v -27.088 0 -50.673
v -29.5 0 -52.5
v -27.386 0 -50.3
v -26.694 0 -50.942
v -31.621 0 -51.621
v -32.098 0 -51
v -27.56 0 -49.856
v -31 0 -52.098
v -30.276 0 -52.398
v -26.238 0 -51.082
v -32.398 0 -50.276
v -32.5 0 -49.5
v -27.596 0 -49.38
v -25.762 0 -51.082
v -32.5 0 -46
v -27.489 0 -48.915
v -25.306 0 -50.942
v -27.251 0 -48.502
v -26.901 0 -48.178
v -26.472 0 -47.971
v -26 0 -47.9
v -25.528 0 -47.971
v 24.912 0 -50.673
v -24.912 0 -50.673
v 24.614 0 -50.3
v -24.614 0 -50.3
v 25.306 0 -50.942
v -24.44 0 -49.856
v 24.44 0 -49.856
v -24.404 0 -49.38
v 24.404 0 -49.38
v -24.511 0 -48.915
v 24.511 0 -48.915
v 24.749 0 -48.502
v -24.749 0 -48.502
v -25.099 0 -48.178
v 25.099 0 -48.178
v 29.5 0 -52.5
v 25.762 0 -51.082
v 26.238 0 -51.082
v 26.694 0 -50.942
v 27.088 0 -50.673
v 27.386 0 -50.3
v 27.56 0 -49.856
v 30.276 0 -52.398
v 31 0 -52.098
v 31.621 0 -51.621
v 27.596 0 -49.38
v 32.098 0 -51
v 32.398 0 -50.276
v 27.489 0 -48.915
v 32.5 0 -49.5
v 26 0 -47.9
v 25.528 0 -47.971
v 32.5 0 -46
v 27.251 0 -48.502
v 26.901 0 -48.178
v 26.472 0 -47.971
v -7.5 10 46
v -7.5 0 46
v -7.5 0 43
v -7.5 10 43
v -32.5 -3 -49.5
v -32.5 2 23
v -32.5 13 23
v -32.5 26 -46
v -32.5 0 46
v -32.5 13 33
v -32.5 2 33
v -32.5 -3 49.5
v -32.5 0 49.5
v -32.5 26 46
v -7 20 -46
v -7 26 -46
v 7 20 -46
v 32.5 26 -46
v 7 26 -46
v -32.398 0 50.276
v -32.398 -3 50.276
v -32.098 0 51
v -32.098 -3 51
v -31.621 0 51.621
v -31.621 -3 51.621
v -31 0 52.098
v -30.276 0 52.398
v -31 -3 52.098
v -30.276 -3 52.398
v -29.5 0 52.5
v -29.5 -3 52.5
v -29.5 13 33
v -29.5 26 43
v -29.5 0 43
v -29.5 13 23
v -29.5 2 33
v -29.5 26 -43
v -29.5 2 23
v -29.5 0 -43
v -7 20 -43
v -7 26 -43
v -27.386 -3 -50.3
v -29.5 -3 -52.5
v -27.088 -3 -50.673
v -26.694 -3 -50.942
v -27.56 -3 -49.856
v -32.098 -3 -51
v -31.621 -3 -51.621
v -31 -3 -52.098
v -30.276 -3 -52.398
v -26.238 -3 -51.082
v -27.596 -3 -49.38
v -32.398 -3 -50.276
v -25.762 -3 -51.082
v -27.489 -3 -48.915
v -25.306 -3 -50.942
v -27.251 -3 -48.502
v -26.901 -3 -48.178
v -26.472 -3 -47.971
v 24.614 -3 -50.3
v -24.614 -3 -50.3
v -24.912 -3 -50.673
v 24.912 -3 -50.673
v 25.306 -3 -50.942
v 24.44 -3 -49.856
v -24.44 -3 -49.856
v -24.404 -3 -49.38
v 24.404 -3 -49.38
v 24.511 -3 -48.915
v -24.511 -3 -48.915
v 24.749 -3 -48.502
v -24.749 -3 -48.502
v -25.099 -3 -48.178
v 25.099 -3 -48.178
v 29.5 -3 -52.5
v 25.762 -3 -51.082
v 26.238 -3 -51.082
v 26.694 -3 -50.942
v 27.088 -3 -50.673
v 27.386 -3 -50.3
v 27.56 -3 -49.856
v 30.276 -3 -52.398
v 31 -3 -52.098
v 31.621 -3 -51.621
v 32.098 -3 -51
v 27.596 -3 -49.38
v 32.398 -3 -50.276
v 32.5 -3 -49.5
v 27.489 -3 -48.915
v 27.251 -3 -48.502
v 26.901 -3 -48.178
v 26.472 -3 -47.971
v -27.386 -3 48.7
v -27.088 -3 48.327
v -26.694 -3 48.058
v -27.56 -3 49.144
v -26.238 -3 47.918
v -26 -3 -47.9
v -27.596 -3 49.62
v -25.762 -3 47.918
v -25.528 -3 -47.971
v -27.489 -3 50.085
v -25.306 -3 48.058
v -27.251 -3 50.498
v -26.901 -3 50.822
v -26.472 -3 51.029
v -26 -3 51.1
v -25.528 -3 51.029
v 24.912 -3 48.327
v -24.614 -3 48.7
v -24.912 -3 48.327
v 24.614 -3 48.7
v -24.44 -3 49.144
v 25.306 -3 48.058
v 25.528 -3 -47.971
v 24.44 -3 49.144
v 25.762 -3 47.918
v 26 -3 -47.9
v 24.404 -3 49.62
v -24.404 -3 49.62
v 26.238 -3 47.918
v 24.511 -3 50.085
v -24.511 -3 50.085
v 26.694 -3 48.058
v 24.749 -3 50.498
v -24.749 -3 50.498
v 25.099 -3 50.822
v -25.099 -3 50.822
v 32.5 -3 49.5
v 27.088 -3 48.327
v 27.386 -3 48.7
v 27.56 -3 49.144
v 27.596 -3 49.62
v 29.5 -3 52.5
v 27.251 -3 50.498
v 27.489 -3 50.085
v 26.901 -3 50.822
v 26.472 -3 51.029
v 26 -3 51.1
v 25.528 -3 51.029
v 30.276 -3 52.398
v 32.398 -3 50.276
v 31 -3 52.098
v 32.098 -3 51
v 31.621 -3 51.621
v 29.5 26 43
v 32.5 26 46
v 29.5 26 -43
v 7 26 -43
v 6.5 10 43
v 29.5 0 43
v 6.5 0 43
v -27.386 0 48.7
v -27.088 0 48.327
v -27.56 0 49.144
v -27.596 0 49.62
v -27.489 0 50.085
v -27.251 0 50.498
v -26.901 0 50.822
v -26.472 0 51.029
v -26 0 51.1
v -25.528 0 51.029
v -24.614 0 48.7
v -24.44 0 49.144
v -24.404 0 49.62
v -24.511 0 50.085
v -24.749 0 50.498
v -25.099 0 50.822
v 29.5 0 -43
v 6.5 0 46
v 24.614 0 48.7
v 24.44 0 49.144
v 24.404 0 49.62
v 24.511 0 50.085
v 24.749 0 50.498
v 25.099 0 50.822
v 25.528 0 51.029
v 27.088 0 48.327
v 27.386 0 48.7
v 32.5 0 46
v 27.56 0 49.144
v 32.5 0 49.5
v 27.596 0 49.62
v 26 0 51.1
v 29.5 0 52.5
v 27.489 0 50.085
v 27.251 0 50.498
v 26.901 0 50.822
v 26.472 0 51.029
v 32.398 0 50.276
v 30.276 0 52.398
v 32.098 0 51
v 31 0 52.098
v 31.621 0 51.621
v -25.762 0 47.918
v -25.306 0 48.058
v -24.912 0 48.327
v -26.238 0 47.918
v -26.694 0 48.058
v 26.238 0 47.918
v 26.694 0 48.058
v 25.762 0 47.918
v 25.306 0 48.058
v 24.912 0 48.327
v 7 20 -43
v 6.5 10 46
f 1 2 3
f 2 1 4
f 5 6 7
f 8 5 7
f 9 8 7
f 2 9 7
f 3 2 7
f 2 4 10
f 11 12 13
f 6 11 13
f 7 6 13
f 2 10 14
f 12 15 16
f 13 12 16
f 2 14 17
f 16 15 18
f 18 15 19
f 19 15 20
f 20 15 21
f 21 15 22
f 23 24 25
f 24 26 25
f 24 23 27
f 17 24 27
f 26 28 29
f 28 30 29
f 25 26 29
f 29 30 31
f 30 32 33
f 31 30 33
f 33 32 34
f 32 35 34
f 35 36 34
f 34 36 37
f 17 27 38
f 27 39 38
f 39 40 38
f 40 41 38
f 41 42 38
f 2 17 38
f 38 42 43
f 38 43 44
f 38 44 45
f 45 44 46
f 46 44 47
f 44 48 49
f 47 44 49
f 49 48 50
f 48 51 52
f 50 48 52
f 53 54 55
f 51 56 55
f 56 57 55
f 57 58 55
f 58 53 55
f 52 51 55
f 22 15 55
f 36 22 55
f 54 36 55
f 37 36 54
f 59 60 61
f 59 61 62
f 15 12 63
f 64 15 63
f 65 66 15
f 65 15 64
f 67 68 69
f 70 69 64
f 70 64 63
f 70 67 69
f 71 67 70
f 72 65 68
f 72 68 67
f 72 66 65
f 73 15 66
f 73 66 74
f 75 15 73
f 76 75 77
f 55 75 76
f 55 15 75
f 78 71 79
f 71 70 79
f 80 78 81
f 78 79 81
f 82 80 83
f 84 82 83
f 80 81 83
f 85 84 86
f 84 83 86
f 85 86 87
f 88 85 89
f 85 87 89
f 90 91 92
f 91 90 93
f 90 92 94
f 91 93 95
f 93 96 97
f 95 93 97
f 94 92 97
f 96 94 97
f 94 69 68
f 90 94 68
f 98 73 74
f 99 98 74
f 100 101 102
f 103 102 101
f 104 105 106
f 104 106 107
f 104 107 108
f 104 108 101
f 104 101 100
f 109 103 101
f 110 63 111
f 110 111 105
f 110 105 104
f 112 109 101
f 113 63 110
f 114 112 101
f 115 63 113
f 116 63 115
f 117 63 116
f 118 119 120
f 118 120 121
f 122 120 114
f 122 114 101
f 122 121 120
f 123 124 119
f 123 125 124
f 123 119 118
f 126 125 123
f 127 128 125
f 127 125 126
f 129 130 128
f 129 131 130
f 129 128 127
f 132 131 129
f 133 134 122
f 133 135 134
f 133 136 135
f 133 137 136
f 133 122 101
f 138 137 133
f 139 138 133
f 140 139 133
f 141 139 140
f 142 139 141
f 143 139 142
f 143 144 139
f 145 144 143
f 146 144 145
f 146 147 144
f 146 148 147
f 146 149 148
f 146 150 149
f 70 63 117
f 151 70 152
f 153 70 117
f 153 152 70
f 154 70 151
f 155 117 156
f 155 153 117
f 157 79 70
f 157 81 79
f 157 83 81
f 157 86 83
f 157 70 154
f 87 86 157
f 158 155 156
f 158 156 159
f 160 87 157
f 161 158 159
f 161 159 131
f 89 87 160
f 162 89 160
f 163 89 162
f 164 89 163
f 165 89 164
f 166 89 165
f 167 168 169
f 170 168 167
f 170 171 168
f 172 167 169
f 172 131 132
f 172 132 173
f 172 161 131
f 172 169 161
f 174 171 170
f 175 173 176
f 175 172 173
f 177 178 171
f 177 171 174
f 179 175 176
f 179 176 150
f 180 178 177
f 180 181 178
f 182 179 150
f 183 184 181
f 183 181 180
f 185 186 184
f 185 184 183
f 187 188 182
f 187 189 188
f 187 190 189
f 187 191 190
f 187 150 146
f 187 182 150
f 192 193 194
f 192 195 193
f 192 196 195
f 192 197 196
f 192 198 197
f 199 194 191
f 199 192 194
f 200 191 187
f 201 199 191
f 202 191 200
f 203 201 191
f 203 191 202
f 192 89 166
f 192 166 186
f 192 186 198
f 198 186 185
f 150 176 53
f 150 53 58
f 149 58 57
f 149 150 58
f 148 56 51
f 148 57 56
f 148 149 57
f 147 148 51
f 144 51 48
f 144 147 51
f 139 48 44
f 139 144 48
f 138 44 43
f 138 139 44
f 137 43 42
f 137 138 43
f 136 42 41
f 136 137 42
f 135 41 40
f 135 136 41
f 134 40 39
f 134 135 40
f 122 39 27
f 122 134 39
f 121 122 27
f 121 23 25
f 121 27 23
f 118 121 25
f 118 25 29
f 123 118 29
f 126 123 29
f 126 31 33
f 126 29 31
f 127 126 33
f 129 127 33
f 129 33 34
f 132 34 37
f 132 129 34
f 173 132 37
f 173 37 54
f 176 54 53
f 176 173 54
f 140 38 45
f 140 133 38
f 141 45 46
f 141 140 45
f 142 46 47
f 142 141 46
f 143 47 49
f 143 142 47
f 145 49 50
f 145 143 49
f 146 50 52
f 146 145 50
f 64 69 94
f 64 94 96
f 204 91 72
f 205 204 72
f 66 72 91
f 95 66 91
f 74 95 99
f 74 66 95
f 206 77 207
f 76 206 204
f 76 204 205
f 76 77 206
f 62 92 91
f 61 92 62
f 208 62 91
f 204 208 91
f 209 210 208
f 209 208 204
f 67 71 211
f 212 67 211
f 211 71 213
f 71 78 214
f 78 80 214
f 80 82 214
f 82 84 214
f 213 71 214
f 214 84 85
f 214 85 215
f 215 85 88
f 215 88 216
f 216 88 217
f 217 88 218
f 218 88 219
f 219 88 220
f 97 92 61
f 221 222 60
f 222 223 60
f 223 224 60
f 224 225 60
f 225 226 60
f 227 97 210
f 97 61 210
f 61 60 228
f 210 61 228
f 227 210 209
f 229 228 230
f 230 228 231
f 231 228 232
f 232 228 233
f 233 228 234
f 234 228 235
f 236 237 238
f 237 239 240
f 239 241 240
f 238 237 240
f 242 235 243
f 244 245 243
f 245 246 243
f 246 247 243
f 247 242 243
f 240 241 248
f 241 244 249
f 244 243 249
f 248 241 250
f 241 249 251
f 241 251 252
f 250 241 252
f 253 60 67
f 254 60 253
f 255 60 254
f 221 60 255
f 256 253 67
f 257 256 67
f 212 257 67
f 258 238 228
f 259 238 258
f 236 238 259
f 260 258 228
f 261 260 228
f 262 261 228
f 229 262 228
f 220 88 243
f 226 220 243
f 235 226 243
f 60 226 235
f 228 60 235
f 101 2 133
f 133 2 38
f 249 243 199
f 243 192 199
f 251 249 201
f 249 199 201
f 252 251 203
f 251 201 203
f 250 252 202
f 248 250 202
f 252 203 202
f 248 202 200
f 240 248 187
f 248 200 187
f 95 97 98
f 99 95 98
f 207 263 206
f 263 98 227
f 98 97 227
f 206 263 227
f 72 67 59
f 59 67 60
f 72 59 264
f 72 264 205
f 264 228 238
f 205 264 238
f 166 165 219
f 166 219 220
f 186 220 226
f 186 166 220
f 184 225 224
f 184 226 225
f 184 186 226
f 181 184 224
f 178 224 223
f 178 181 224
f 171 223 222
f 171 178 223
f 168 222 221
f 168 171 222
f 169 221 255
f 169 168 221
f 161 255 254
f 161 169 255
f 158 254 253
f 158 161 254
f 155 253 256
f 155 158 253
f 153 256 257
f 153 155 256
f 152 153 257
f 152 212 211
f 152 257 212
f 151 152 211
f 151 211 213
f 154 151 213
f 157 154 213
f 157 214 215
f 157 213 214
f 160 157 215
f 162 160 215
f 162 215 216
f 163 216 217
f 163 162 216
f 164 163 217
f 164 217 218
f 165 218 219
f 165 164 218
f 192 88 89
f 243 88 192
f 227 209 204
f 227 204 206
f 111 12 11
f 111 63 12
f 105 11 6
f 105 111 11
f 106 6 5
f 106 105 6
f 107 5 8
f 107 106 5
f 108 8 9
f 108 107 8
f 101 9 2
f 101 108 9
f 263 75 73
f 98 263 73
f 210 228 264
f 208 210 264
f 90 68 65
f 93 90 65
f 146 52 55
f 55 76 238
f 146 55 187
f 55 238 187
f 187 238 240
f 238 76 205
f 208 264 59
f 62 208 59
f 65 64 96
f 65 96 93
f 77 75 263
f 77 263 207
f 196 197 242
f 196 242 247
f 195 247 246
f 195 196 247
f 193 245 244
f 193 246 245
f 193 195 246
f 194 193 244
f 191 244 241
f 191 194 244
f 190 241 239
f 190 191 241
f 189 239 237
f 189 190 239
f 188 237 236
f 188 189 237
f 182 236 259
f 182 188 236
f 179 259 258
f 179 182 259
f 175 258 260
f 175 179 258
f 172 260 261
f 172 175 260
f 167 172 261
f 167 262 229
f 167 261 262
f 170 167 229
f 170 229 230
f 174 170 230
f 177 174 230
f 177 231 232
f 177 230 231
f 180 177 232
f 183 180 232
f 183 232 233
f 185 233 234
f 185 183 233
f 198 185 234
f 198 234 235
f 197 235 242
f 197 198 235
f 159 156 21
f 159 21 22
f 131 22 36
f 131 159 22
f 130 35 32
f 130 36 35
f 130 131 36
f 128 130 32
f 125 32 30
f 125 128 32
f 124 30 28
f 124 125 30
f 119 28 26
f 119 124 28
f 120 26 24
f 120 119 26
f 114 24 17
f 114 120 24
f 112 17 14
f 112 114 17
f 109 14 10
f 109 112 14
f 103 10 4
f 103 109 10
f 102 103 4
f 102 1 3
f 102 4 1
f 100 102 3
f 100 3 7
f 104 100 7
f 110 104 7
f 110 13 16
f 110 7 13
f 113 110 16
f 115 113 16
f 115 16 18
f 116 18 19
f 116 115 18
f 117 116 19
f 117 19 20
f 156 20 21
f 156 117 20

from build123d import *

# Parameters (mm, degrees)
SKETCH_1_W               = 65
SKETCH_1_H               = 92
SKETCH_1_W_2             = 59
SKETCH_1_H_2             = 86
EXTRUDE_1_DEPTH          = 26
SKETCH_2_W               = 65
SKETCH_2_H               = 105
EXTRUDE_2_DEPTH          = 3
CUT_EXTRUDE_1_DEPTH      = 67.996268553
CUT_EXTRUDE_1_DEPTH_BACK = 67.996268553
SKETCH_3_R               = 1.6
FILLET_1_R               = 3
CUT_EXTRUDE_START        = -3
CUT_EXTRUDE_2_OUTLINE_W  = 14
CUT_EXTRUDE_2_OUTLINE_H  = 10
CUT_EXTRUDE_2_DEPTH      = 3
CUT_EXTRUDE_3_OUTLINE_W  = 10
CUT_EXTRUDE_3_OUTLINE_H  = 11
CUT_EXTRUDE_3_DEPTH      = 3
SKETCH_6_W               = 14
SKETCH_6_H               = 6
CUT_EXTRUDE_4_DEPTH      = 10


# Read off the part's stored shape, not the designer's step: 切除-拉伸2, 切除-拉伸3
with BuildPart() as part:
    # 草图1 → 凸台-拉伸1 (new body)
    with BuildSketch(Plane(origin=(0, 0, 0), x_dir=(1, 0, 0), z_dir=(0, 1, 0))):
        Rectangle(SKETCH_1_W, SKETCH_1_H)
        Rectangle(SKETCH_1_W_2, SKETCH_1_H_2, mode=Mode.SUBTRACT)
    extrude(amount=EXTRUDE_1_DEPTH)

    # 草图2 → 凸台-拉伸2 (add)
    with BuildSketch(Plane.XZ):
        Rectangle(SKETCH_2_W, SKETCH_2_H)
    extrude(amount=EXTRUDE_2_DEPTH)

    # 草图3 → 切除-拉伸1 (cut, two sides: drawn at the far end of the back side and taken through both)
    with BuildSketch(Plane(origin=(0, 0, 0), x_dir=(1, 0, 0), z_dir=(0, 1, 0)).offset(-CUT_EXTRUDE_1_DEPTH_BACK)):
        with Locations(Location((-26, 49.5, 0), (0, 0, 270))):
            Circle(SKETCH_3_R)
        with Locations(Location((26, 49.5, 0), (0, 0, 270))):
            Circle(SKETCH_3_R)
        with Locations(Location((26, -49.5, 0), (0, 0, 270))):
            Circle(SKETCH_3_R)
        with Locations(Location((-26, -49.5, 0), (0, 0, 270))):
            Circle(SKETCH_3_R)
    extrude(amount=CUT_EXTRUDE_1_DEPTH + CUT_EXTRUDE_1_DEPTH_BACK, mode=Mode.SUBTRACT)

    # 圆角1
    fillet_1_edges = [part.edges().sort_by_distance(p)[0] for p in [
        (32.5, -1.5, -52.5),
        (32.5, -1.5, 52.5),
        (-32.5, -1.5, 52.5),
        (-32.5, -1.5, -52.5),
    ]]
    fillet(fillet_1_edges, radius=FILLET_1_R)

    # 切除-拉伸2 outline → 切除-拉伸2 (cut)
    with BuildSketch(Plane(origin=(0, 0, 43), x_dir=(-1, 0, 0), z_dir=(0, 0, -1)).offset(CUT_EXTRUDE_START)):
        with Locations((0.5, 5)):
            Rectangle(CUT_EXTRUDE_2_OUTLINE_W, CUT_EXTRUDE_2_OUTLINE_H)
    extrude(amount=CUT_EXTRUDE_2_DEPTH, mode=Mode.SUBTRACT)

    # 切除-拉伸3 outline → 切除-拉伸3 (cut)
    with BuildSketch(Plane(origin=(-29.5, 0, 0), x_dir=(0, 0, -1), z_dir=(1, 0, 0)).offset(CUT_EXTRUDE_START)):
        with Locations((-28, 7.5)):
            Rectangle(CUT_EXTRUDE_3_OUTLINE_W, CUT_EXTRUDE_3_OUTLINE_H)
    extrude(amount=CUT_EXTRUDE_3_DEPTH, mode=Mode.SUBTRACT)

    # 草图6 → 切除-拉伸4 (cut)
    with BuildSketch(Plane(origin=(0, 0, -46), x_dir=(-1, 0, 0), z_dir=(0, 0, -1))):
        with Locations((0, 23)):
            Rectangle(SKETCH_6_W, SKETCH_6_H)
    extrude(amount=-CUT_EXTRUDE_4_DEPTH, mode=Mode.SUBTRACT)


solid = part.part
